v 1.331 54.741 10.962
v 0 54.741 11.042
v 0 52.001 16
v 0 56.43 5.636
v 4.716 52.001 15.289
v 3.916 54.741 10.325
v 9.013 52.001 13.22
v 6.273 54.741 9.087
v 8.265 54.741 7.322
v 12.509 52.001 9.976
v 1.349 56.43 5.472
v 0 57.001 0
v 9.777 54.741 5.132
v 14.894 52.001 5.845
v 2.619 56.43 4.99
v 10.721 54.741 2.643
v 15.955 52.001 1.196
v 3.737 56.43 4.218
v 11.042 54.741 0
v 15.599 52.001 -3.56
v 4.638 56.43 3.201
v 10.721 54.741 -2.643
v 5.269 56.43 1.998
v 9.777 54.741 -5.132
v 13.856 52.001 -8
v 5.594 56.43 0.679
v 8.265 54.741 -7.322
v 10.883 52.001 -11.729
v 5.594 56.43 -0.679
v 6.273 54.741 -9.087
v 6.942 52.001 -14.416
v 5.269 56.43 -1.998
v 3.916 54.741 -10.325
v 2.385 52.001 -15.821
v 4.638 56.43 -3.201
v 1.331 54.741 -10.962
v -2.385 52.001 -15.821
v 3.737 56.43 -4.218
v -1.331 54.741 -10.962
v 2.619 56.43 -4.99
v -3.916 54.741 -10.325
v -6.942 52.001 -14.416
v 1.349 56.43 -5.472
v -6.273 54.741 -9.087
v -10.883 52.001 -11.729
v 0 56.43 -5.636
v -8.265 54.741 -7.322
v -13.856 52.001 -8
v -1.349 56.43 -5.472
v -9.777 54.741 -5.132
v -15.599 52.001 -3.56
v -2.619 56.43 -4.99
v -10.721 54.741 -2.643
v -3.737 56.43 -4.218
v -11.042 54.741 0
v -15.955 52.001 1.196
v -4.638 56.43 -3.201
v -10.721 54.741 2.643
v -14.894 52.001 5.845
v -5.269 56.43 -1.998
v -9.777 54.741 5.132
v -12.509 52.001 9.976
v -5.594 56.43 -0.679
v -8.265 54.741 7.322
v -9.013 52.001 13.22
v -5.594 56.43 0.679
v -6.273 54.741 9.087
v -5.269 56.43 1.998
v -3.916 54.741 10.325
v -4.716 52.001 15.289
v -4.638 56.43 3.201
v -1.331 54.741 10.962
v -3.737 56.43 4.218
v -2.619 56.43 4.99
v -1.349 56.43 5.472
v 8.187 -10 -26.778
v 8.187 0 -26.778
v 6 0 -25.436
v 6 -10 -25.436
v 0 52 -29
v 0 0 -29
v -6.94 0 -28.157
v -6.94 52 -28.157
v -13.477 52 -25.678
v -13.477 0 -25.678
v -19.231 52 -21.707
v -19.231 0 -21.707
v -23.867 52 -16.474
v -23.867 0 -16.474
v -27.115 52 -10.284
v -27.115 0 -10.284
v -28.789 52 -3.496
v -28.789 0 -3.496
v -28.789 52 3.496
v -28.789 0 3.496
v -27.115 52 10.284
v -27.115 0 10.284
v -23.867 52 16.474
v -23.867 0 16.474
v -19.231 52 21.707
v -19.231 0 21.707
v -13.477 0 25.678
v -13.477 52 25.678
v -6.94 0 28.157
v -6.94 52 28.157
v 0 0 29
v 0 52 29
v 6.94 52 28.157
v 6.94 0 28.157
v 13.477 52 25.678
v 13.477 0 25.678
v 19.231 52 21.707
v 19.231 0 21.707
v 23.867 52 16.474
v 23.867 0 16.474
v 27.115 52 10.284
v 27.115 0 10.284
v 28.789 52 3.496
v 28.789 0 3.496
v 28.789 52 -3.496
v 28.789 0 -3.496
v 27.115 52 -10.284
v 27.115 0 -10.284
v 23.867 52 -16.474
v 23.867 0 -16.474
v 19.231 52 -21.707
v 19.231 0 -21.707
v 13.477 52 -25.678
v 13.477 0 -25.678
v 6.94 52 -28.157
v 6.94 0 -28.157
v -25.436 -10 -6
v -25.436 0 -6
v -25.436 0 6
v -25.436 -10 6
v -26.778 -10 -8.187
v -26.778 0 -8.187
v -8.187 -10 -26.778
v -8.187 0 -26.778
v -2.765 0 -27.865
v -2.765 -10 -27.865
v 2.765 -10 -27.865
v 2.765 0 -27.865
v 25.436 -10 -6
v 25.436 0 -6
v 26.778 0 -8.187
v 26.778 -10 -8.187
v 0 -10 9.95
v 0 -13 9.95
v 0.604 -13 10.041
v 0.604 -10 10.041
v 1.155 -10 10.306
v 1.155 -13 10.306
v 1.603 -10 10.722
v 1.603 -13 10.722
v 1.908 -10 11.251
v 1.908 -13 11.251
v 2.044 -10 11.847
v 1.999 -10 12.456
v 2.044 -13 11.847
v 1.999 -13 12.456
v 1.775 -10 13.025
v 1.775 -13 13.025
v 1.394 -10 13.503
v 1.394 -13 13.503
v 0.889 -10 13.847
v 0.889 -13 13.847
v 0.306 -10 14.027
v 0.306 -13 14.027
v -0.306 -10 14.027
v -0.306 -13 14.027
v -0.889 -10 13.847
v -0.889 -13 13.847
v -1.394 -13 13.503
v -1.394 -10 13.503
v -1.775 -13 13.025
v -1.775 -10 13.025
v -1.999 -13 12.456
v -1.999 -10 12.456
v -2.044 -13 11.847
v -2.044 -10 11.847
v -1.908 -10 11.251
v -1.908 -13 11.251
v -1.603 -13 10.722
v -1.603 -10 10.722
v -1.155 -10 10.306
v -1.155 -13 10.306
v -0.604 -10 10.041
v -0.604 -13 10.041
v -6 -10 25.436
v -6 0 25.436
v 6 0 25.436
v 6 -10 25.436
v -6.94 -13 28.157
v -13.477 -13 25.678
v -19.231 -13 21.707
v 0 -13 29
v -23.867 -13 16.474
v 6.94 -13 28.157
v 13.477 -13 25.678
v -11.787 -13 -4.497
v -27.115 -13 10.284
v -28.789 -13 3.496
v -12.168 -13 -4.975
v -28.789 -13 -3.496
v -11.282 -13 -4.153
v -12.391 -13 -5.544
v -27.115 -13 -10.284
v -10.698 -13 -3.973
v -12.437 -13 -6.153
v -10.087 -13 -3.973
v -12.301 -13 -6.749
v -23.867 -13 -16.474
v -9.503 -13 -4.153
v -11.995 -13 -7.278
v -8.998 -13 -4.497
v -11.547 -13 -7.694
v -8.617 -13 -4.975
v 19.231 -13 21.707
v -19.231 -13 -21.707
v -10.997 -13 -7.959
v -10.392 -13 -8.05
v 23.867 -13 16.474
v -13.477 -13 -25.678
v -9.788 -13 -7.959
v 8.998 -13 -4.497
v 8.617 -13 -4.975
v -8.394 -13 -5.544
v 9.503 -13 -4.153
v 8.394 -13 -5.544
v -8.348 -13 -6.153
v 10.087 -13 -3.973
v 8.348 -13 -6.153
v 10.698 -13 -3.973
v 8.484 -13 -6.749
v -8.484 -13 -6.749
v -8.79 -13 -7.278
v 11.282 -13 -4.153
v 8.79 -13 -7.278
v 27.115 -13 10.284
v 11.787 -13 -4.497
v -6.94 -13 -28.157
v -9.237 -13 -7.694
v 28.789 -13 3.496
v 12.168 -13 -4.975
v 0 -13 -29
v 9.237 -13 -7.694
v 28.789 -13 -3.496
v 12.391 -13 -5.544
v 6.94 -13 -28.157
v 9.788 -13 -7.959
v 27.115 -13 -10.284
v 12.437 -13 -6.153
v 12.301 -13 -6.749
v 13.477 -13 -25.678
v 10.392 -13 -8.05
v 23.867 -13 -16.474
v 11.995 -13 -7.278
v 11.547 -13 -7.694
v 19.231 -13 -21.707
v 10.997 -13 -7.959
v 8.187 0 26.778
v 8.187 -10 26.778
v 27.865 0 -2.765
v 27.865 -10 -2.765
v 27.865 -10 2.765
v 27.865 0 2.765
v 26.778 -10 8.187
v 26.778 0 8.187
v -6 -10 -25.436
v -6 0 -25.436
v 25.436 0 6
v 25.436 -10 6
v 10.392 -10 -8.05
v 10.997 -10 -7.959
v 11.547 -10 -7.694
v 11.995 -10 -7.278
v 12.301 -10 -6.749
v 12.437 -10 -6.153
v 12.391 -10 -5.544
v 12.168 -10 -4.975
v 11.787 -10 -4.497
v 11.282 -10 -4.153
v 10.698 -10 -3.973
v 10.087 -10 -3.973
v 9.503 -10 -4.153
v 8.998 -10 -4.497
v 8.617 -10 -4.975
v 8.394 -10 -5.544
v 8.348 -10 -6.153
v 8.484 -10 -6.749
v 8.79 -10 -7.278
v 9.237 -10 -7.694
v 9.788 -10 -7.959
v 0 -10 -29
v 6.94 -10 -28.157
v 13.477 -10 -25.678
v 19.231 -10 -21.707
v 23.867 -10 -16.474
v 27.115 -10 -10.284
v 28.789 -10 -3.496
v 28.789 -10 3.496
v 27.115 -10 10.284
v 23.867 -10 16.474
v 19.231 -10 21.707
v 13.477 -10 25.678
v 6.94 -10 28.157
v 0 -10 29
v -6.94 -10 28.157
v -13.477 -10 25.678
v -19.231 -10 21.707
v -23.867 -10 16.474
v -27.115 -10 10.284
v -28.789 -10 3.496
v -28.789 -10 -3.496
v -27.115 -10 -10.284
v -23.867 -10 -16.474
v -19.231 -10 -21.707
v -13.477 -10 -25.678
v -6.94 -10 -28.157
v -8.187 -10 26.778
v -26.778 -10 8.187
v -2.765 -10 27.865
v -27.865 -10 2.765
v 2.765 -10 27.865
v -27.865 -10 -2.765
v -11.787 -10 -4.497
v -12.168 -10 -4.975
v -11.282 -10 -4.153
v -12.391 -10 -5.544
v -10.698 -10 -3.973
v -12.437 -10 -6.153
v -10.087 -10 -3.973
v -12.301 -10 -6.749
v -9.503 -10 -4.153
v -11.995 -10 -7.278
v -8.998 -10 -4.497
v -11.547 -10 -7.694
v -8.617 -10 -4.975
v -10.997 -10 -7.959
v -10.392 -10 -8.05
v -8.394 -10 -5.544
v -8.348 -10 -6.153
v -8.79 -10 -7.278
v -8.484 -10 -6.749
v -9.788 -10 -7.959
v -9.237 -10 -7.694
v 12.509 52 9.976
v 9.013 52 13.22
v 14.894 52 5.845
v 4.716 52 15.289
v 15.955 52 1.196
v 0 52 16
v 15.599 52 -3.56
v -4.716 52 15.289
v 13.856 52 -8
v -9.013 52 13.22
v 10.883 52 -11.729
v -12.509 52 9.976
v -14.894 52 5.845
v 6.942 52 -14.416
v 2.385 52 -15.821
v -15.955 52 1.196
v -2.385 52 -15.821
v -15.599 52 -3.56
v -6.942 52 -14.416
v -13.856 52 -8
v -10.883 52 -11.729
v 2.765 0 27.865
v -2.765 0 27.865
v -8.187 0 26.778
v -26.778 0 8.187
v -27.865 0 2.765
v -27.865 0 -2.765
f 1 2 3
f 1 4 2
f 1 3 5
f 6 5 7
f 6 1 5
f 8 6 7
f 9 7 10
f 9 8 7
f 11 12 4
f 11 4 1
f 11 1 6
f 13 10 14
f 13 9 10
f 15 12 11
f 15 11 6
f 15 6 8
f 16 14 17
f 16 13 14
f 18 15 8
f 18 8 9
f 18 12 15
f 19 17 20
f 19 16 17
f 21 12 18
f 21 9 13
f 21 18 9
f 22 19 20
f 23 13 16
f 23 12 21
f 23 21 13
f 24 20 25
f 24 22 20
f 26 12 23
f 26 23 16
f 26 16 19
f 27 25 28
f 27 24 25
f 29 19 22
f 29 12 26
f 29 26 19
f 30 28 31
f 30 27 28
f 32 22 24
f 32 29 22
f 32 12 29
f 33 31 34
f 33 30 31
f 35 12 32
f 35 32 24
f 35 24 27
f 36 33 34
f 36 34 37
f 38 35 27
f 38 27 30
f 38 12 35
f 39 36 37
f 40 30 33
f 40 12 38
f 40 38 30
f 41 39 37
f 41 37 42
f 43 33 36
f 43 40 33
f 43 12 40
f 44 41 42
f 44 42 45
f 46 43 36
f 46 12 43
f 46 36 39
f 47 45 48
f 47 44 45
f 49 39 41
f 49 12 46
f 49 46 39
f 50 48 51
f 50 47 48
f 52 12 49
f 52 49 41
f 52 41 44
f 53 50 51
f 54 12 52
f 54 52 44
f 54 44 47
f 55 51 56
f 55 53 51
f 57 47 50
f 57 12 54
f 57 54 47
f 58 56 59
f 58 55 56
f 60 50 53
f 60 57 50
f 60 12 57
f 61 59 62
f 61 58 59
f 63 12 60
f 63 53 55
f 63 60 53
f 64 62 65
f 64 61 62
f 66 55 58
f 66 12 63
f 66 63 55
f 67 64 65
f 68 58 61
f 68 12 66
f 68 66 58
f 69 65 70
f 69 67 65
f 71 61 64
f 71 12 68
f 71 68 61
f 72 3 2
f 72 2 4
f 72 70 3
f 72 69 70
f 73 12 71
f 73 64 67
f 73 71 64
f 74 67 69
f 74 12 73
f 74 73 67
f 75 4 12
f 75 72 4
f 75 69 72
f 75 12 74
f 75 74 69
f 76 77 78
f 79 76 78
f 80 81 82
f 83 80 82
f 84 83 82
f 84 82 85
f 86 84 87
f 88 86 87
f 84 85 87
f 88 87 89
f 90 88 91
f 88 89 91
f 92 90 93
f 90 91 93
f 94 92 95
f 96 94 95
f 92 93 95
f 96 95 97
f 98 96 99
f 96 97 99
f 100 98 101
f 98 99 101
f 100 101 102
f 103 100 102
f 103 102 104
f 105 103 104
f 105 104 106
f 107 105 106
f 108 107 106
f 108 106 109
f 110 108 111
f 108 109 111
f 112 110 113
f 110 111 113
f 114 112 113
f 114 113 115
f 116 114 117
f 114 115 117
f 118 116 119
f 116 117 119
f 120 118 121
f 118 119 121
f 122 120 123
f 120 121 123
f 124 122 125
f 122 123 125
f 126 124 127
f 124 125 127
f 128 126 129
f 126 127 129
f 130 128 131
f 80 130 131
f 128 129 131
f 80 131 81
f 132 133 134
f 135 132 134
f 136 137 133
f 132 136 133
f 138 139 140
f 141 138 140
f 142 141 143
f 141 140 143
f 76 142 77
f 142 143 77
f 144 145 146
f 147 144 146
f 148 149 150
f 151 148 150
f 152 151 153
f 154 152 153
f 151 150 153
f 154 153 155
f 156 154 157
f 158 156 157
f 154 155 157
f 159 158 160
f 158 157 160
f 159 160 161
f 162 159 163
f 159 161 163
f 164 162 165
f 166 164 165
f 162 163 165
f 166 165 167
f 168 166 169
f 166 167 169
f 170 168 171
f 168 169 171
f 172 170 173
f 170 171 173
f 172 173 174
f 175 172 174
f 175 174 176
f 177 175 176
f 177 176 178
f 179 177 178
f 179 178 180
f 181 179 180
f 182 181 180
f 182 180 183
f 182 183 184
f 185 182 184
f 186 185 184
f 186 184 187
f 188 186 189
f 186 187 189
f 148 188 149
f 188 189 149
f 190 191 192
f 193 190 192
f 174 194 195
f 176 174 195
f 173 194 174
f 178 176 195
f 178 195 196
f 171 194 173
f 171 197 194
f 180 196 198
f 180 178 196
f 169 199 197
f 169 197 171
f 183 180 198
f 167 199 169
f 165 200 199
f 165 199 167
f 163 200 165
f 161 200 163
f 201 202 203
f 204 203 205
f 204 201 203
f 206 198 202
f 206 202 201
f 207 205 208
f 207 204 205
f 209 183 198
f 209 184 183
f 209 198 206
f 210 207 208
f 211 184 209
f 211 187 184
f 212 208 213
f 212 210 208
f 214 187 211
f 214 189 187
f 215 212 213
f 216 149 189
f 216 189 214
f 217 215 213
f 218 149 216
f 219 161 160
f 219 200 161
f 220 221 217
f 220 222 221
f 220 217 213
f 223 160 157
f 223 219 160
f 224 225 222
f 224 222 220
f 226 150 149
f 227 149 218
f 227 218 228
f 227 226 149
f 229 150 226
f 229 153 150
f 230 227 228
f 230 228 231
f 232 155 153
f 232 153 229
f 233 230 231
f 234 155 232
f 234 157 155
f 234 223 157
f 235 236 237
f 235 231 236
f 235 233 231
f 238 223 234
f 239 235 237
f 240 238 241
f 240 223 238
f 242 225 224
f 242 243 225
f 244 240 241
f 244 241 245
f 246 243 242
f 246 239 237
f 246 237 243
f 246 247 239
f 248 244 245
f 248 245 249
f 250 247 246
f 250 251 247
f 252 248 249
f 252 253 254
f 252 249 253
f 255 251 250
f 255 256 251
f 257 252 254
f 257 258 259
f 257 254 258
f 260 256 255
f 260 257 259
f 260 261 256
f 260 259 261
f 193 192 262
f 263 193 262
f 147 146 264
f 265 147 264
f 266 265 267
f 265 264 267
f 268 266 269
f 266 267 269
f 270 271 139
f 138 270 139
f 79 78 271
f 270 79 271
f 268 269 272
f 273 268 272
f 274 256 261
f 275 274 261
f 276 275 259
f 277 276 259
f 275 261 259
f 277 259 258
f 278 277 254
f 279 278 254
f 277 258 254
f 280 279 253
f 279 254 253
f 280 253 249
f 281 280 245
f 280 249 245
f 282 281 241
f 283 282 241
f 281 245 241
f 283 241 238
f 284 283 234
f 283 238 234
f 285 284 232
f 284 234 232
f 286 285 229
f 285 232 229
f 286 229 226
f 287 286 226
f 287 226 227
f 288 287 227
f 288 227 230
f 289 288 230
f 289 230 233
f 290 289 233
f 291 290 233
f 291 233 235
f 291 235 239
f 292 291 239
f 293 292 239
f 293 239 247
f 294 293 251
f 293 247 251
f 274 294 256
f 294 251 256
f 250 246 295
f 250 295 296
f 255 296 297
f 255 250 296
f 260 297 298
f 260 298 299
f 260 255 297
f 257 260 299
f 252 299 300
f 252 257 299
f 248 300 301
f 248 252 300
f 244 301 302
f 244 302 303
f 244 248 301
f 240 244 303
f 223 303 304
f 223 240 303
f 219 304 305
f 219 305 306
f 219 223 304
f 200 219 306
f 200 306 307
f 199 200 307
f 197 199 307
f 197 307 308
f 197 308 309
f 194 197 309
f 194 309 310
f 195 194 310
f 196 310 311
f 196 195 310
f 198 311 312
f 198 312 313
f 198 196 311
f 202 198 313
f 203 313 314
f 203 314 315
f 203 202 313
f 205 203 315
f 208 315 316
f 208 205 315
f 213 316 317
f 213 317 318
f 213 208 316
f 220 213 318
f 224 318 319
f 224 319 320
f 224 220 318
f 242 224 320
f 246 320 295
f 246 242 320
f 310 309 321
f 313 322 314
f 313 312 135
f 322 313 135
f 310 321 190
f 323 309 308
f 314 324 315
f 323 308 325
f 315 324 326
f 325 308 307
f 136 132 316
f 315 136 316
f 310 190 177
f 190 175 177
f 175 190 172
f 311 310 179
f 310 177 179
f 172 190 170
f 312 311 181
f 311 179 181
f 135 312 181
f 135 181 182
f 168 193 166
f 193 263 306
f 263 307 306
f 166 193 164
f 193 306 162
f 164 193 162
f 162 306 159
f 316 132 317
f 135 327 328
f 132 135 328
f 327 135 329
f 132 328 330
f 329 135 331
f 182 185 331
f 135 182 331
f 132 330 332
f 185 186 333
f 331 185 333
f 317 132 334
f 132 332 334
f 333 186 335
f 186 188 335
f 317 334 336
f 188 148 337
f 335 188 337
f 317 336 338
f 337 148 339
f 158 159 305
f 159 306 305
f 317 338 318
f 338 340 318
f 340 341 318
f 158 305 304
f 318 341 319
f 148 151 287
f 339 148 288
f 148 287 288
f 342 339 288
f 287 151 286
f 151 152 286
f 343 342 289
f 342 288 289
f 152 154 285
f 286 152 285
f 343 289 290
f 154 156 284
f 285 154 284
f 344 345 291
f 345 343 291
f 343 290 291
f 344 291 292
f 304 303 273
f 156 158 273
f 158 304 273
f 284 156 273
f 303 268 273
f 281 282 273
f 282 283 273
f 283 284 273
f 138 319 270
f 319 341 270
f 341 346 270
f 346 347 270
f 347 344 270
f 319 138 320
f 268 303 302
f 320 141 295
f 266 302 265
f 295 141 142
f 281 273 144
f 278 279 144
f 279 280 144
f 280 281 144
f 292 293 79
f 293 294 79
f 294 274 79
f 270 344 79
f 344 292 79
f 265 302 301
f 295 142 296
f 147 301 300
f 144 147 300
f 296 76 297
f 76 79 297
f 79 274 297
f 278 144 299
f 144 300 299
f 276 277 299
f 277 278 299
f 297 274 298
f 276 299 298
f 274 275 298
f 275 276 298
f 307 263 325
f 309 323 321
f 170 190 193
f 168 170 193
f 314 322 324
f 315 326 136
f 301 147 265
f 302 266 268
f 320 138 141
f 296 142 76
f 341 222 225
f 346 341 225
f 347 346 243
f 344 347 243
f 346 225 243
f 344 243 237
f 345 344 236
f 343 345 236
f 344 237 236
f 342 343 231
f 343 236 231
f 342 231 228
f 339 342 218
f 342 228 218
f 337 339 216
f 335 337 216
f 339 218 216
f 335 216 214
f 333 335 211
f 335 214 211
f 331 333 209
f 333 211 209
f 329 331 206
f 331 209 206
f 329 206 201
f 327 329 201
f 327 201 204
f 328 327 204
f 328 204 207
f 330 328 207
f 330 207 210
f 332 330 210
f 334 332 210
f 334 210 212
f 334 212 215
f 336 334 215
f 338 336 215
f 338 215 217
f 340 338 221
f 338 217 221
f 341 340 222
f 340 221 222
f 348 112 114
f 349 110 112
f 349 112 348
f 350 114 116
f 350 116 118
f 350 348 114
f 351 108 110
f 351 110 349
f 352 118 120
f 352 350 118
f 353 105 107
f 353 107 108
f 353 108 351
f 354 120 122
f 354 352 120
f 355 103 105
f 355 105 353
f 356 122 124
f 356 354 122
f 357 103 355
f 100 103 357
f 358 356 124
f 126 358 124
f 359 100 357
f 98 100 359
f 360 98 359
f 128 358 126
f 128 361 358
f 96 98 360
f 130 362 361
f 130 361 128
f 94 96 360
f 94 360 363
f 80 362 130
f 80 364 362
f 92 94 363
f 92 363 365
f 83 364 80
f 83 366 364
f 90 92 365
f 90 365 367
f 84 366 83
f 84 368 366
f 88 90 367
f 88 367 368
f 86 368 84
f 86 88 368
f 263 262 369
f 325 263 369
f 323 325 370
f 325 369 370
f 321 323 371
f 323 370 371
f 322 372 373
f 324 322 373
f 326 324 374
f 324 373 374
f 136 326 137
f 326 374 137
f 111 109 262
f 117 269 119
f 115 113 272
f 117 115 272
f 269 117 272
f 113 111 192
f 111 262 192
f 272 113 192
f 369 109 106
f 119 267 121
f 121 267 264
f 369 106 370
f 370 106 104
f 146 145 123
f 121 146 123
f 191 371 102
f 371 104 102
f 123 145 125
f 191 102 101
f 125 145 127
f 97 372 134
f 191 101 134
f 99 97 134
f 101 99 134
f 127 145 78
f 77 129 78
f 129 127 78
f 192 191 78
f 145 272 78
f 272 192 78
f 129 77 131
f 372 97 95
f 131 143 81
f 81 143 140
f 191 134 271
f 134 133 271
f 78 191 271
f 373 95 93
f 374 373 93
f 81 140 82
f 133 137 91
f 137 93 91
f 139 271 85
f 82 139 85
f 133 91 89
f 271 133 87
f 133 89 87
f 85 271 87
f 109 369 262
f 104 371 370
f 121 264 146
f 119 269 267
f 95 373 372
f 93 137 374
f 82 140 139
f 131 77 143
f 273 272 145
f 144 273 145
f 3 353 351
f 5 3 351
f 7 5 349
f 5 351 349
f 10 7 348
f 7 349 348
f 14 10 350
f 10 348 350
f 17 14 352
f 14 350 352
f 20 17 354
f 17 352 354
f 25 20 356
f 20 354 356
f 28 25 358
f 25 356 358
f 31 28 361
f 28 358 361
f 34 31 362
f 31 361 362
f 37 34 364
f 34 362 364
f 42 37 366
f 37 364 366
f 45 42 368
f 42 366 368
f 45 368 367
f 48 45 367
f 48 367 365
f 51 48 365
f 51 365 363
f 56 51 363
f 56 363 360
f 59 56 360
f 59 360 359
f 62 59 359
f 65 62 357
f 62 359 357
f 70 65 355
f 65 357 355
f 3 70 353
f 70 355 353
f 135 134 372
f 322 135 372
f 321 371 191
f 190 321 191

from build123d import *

# Parameters (mm, degrees)
CROQUIS1_R              = 29
SALIENTE_EXTRUIR1_DEPTH = 52
SALIENTE_EXTRUIR2_DEPTH = 10
SALIENTE_EXTRUIR3_START = 3
CROQUIS3_R              = 29
SALIENTE_EXTRUIR3_DEPTH = 3
CROQUIS6_R              = 16
SALIENTE_EXTRUIR4_DEPTH = 0.001
C_PULA1_FACE_RADIUS     = 16
C_PULA1_HEIGHT          = 5
CROQUIS7_R              = 2.05
CORTAR_EXTRUIR1_DEPTH   = 3


with BuildPart() as part:
    # Croquis1 → Saliente-Extruir1 (new body)
    with BuildSketch(Plane(origin=(0, 0, 0), x_dir=(1, 0, 0), z_dir=(0, 1, 0))):
        with Locations(Location((0, 0, 0), (0, 0, 90))):
            Circle(CROQUIS1_R)
    extrude(amount=SALIENTE_EXTRUIR1_DEPTH)

    # Croquis2 → Saliente-Extruir2 (add)
    with BuildSketch(Plane.XZ):
        with BuildLine():
            Line((25.4355, 6), (25.4355, -6))
            Line((25.4355, -6), (26.777981394, -8.18680125))
            ThreePointArc((26.777981394, -8.18680125), (28.0015, 0), (26.777981394, 8.18680125))
            Line((26.777981394, 8.18680125), (25.4355, 6))
        make_face()
        with BuildLine():
            Line((-6, 25.4355), (6, 25.4355))
            Line((6, 25.4355), (8.18680125, 26.777981394))
            ThreePointArc((8.18680125, 26.777981394), (0, 28.0015), (-8.18680125, 26.777981394))
            Line((-8.18680125, 26.777981394), (-6, 25.4355))
        make_face()
        with BuildLine():
            Line((6, -25.4355), (-6, -25.4355))
            Line((-6, -25.4355), (-8.18680125, -26.777981394))
            ThreePointArc((-8.18680125, -26.777981394), (0, -28.0015), (8.18680125, -26.777981394))
            Line((8.18680125, -26.777981394), (6, -25.4355))
        make_face()
        with BuildLine():
            Line((-25.4355, -6), (-25.4355, 6))
            Line((-25.4355, 6), (-26.777981394, 8.18680125))
            ThreePointArc((-26.777981394, 8.18680125), (-28.0015, 0), (-26.777981394, -8.18680125))
            Line((-26.777981394, -8.18680125), (-25.4355, -6))
        make_face()
    extrude(amount=SALIENTE_EXTRUIR2_DEPTH)

    # Croquis3 → Saliente-Extruir3 (add)
    with BuildSketch(Plane.XZ.offset(10).offset(SALIENTE_EXTRUIR3_START)):
        with Locations(Location((0, 0, 0), (0, 0, 270))):
            Circle(CROQUIS3_R)
    extrude(amount=-SALIENTE_EXTRUIR3_DEPTH)

    # Croquis6 → Saliente-Extruir4 (add)
    with BuildSketch(Plane(origin=(0, 52, 0), x_dir=(1, 0, 0), z_dir=(0, 1, 0))):
        with Locations(Location((0, 0, 0), (0, 0, 270))):
            Circle(CROQUIS6_R)
    extrude(amount=SALIENTE_EXTRUIR4_DEPTH)

    # Cúpula1: a dome of height H over a round flat face of radius A is a cap of a sphere of radius (A * A + H * H) / (2 * H)
    c_pula1_r = (C_PULA1_FACE_RADIUS * C_PULA1_FACE_RADIUS + C_PULA1_HEIGHT * C_PULA1_HEIGHT) / (2 * C_PULA1_HEIGHT)
    c_pula1_base = Plane((0, 52.001, 0), z_dir=(0, 1, 0))
    with Locations(c_pula1_base.offset(C_PULA1_HEIGHT - c_pula1_r)):
        c_pula1_ball = Sphere(c_pula1_r, mode=Mode.PRIVATE)
    add(split(c_pula1_ball, bisect_by=c_pula1_base, keep=Keep.TOP, mode=Mode.PRIVATE))

    # Croquis7 → Cortar-Extruir1 (cut)
    with BuildSketch(Plane.XZ.offset(13)):
        with Locations(Location((0, 12, 0), (0, 0, 270))):
            Circle(CROQUIS7_R)
        with Locations(Location((10.392304845, -6, 0), (0, 0, 270))):
            Circle(CROQUIS7_R)
        with Locations(Location((-10.392304845, -6, 0), (0, 0, 270))):
            Circle(CROQUIS7_R)
    extrude(amount=-CORTAR_EXTRUIR1_DEPTH, mode=Mode.SUBTRACT)


solid = part.part
